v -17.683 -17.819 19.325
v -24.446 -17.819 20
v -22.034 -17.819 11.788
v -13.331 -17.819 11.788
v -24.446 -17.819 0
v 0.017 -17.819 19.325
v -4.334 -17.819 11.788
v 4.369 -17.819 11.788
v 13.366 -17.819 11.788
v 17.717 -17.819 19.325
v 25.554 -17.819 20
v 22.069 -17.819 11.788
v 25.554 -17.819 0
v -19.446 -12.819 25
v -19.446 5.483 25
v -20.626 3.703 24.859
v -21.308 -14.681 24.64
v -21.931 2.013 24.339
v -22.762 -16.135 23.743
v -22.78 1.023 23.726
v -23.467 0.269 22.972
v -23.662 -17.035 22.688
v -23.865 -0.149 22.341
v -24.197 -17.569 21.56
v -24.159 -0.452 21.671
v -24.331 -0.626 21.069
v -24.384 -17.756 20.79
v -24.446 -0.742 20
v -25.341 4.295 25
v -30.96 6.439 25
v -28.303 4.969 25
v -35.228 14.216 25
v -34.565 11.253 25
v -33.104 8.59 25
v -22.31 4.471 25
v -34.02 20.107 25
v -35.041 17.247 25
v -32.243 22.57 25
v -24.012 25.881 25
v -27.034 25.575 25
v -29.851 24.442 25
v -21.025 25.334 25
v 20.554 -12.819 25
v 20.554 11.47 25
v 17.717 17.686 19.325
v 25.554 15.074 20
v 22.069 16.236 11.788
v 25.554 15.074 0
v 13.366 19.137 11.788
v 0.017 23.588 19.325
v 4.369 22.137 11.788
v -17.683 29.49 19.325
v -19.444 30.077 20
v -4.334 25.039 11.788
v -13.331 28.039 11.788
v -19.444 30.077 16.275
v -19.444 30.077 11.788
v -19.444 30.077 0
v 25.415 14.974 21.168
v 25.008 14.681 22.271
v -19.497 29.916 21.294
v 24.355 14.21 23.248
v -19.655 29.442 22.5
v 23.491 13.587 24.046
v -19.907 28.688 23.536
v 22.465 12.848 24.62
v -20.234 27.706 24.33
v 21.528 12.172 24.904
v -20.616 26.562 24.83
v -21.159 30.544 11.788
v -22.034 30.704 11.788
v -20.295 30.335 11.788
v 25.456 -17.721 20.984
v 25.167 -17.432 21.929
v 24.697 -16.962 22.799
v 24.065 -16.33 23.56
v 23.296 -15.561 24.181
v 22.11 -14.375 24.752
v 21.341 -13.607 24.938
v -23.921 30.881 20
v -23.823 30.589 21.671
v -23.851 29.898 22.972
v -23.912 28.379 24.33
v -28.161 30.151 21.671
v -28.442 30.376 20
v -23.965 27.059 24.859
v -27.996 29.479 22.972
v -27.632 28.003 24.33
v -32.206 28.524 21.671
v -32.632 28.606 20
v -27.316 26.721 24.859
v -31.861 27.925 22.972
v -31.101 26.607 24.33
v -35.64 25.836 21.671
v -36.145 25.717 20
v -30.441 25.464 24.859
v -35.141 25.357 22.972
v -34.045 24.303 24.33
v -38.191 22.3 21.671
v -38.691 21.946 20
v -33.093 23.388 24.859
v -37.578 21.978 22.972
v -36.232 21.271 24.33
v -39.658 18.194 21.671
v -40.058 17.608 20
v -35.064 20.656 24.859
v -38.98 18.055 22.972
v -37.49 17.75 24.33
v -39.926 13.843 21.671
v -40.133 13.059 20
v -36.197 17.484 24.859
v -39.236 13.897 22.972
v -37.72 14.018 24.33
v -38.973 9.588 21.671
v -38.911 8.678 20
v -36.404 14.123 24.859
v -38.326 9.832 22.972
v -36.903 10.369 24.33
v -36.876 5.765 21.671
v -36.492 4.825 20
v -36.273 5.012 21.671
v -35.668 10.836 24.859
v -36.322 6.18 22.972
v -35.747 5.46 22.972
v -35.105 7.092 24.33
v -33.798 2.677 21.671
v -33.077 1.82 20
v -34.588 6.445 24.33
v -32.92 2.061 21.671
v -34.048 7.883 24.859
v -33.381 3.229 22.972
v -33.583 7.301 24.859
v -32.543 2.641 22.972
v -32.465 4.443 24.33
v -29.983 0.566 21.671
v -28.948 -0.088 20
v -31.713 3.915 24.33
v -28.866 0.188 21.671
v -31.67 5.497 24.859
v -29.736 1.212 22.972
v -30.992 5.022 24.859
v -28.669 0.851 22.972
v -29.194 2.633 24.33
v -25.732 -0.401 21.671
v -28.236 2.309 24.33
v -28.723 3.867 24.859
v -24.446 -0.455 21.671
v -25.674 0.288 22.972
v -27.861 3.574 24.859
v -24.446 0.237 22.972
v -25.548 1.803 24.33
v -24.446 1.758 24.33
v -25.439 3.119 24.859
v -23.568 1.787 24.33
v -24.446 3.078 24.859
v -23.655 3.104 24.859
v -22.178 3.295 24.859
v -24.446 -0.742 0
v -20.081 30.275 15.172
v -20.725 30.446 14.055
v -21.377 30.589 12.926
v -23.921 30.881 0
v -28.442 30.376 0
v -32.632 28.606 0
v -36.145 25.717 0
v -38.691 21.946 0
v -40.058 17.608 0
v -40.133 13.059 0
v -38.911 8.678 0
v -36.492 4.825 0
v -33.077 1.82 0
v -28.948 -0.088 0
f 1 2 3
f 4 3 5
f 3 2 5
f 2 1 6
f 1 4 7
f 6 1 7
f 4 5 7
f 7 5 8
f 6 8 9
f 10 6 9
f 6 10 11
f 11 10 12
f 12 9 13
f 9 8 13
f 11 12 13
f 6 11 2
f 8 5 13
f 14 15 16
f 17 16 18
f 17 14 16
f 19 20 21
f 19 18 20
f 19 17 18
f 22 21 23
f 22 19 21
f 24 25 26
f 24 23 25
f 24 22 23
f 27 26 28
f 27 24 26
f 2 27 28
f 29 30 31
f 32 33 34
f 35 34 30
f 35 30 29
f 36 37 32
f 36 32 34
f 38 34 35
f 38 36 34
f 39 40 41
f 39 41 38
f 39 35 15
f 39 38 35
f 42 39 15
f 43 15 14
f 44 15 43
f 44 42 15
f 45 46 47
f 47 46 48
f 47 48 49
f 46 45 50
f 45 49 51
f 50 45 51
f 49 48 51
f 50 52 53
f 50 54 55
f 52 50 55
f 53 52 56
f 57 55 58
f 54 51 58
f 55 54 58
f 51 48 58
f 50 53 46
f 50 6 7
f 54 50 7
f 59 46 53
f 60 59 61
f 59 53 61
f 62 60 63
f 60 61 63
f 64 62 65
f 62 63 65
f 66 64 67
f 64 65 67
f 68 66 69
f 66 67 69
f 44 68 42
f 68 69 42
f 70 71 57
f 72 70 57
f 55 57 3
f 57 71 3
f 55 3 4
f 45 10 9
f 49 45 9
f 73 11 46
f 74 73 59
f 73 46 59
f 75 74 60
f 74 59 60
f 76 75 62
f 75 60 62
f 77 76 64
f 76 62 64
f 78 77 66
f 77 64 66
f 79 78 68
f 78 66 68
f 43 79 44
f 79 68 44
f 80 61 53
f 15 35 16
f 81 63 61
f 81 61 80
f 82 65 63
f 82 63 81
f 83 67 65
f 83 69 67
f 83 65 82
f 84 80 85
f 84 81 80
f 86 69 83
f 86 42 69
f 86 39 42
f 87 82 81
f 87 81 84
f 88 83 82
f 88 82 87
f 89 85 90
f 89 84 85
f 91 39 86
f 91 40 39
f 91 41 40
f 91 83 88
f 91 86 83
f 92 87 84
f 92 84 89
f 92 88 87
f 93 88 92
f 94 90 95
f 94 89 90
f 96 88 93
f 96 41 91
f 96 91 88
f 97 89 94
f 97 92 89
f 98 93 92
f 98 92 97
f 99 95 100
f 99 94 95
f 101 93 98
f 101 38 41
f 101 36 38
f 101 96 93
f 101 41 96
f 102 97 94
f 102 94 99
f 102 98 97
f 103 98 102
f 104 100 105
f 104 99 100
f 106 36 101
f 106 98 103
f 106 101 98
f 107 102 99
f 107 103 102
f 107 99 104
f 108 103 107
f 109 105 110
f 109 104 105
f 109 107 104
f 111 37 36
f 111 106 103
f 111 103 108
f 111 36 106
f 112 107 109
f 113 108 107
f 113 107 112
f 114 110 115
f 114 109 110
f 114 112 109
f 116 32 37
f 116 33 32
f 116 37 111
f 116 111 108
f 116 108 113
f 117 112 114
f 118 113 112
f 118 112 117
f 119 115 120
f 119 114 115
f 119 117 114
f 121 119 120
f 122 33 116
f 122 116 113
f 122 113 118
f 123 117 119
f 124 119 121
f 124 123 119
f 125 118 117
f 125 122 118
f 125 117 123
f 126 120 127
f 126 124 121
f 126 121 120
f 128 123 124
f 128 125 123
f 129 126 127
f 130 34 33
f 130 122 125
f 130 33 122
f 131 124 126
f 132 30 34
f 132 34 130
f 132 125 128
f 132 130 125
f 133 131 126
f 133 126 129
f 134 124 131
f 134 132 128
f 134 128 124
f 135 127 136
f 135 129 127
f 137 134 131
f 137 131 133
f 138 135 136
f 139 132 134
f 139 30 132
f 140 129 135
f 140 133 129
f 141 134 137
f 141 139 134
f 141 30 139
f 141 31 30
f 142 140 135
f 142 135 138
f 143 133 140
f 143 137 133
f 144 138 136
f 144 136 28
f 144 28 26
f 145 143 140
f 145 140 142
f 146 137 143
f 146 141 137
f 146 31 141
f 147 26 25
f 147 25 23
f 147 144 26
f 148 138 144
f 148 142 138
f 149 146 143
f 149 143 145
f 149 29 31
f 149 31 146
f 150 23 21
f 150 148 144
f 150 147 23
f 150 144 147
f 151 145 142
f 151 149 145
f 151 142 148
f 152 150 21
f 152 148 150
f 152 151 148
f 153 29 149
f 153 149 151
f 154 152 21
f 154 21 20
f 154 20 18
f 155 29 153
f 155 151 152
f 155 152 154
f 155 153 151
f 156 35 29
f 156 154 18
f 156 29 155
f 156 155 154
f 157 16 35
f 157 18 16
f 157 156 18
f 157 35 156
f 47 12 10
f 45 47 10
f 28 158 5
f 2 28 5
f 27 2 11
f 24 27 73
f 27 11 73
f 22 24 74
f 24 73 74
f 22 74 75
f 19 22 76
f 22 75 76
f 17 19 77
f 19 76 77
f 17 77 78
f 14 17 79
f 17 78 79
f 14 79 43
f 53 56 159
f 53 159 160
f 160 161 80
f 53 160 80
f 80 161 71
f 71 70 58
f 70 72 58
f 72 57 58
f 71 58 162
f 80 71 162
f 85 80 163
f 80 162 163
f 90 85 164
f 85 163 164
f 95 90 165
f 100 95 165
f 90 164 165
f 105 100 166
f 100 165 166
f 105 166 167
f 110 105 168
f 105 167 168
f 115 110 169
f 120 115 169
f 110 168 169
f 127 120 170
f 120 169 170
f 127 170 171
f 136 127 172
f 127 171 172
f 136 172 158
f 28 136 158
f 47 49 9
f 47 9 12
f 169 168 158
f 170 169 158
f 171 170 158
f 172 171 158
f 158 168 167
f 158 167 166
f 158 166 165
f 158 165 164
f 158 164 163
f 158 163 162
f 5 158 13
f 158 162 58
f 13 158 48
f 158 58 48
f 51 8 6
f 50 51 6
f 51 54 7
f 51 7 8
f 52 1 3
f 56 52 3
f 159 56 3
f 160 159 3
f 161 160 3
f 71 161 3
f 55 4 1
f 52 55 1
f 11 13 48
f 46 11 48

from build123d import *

# Parameters (mm, degrees)
F1_DEPTH = 25
F4_DEPTH = 25
F5_DEPTH = 23.7095438224
F6_R     = 5


# Not quite as in the source:
# - the program builds the solid bodies; features that only make, move or delete a surface that nothing else refers to are left out


with BuildPart() as f1:
    # F0 (on Top) → F1 (new body)
    with BuildSketch(Plane.XY):
        with BuildLine():
            ThreePointArc((-24.4463197887, 8.4633977604), (-29.1204506303, 19.7477478306), (-17.8361005601, 15.073616989))
            Line((-17.8361005601, 15.073616989), (-8.6304908186, 15.073616989))
            ThreePointArc((-8.6304908186, 15.073616989), (-11.6154192696, 24.3206942504), (-19.4435108685, 30.0773614855))
            ThreePointArc((-19.4435108685, 30.0773614855), (-40.0578075922, 17.607762717), (-24.4463197887, -0.7422119811))
            Line((-24.4463197887, -0.7422119811), (-24.4463197887, 8.4633977604))
        make_face()
        with BuildLine():
            Line((-17.8361005601, 15.073616989), (-24.4463197887, 15.073616989))
            Line((-24.4463197887, 15.073616989), (-24.4463197887, 8.4633977604))
            ThreePointArc((-24.4463197887, 8.4633977604), (-19.772188947, 10.3994861473), (-17.8361005601, 15.073616989))
        make_face()
        with BuildLine():
            Line((-24.4463197887, 8.4633977604), (-24.4463197887, 15.073616989))
            Line((-24.4463197887, 15.073616989), (-17.8361005601, 15.073616989))
            ThreePointArc((-17.8361005601, 15.073616989), (-29.1204506303, 19.7477478306), (-24.4463197887, 8.4633977604))
        make_face()
        with BuildLine():
            ThreePointArc((-19.4435108685, 30.0773614855), (-11.6154192696, 24.3206942504), (-8.6304908186, 15.073616989))
            Line((-8.6304908186, 15.073616989), (25.5536802113, 15.073616989))
            Line((25.5536802113, 15.073616989), (-19.4435108685, 30.0773614855))
        make_face()
        with BuildLine():
            Line((25.5536802113, 15.073616989), (-8.6304908186, 15.073616989))
            ThreePointArc((-8.6304908186, 15.073616989), (-13.2628398739, 3.8901370741), (-24.4463197887, -0.7422119811))
            Line((-24.4463197887, -0.7422119811), (-24.4463197887, -17.8190978634))
            Line((-24.4463197887, -17.8190978634), (25.5536802113, -17.8190978634))
            Line((25.5536802113, -17.8190978634), (25.5536802113, 15.073616989))
        make_face()
        with BuildLine():
            Line((-8.6304908186, 15.073616989), (-17.8361005601, 15.073616989))
            ThreePointArc((-17.8361005601, 15.073616989), (-19.772188947, 10.3994861473), (-24.4463197887, 8.4633977604))
            Line((-24.4463197887, 8.4633977604), (-24.4463197887, -0.7422119811))
            ThreePointArc((-24.4463197887, -0.7422119811), (-13.2628398739, 3.8901370741), (-8.6304908186, 15.073616989))
        make_face()
    extrude(amount=F1_DEPTH)

    # F3 (on face) → F4 (cut)
    with BuildSketch(Plane.XZ.offset(17.8190978634)):
        Polygon((-22.0338956294, 11.7883440107), (-13.3311382654, 11.7883440107), (-17.6825169474, 19.3251529709), align=None)
        Polygon((4.3688617346, 11.7883440107), (0.0174830526, 19.3251529709), (-4.3338956294, 11.7883440107), align=None)
        Polygon((22.0688617346, 11.7883440107), (17.7174830526, 19.3251529709), (13.3661043706, 11.7883440107), align=None)
    extrude(amount=-F4_DEPTH, mode=Mode.SUBTRACT)

    # F5 (cut, through all): faces of the model
    f5_faces = [f1.faces().sort_by_distance(p)[0] for p in [
        (-17.6825169474, 7.1809021366, 14.3006136641),
        (0.0174830526, 7.1809021366, 14.3006136641),
        (17.7174830526, 7.1809021366, 14.3006136641),
    ]]
    extrude(f5_faces, amount=-F5_DEPTH, mode=Mode.SUBTRACT)

    # F6
    f6_edges = [f1.edges().sort_by_distance(p)[0] for p in [
        (-40.057808, 17.607763, 25),
        (-24.44632, -9.280655, 25),
        (0.55368, -17.819098, 25),
        (25.55368, -1.37274, 25),
        (3.055085, 22.575489, 25),
    ]]
    fillet(f6_edges, radius=F6_R)


solid = f1.part
